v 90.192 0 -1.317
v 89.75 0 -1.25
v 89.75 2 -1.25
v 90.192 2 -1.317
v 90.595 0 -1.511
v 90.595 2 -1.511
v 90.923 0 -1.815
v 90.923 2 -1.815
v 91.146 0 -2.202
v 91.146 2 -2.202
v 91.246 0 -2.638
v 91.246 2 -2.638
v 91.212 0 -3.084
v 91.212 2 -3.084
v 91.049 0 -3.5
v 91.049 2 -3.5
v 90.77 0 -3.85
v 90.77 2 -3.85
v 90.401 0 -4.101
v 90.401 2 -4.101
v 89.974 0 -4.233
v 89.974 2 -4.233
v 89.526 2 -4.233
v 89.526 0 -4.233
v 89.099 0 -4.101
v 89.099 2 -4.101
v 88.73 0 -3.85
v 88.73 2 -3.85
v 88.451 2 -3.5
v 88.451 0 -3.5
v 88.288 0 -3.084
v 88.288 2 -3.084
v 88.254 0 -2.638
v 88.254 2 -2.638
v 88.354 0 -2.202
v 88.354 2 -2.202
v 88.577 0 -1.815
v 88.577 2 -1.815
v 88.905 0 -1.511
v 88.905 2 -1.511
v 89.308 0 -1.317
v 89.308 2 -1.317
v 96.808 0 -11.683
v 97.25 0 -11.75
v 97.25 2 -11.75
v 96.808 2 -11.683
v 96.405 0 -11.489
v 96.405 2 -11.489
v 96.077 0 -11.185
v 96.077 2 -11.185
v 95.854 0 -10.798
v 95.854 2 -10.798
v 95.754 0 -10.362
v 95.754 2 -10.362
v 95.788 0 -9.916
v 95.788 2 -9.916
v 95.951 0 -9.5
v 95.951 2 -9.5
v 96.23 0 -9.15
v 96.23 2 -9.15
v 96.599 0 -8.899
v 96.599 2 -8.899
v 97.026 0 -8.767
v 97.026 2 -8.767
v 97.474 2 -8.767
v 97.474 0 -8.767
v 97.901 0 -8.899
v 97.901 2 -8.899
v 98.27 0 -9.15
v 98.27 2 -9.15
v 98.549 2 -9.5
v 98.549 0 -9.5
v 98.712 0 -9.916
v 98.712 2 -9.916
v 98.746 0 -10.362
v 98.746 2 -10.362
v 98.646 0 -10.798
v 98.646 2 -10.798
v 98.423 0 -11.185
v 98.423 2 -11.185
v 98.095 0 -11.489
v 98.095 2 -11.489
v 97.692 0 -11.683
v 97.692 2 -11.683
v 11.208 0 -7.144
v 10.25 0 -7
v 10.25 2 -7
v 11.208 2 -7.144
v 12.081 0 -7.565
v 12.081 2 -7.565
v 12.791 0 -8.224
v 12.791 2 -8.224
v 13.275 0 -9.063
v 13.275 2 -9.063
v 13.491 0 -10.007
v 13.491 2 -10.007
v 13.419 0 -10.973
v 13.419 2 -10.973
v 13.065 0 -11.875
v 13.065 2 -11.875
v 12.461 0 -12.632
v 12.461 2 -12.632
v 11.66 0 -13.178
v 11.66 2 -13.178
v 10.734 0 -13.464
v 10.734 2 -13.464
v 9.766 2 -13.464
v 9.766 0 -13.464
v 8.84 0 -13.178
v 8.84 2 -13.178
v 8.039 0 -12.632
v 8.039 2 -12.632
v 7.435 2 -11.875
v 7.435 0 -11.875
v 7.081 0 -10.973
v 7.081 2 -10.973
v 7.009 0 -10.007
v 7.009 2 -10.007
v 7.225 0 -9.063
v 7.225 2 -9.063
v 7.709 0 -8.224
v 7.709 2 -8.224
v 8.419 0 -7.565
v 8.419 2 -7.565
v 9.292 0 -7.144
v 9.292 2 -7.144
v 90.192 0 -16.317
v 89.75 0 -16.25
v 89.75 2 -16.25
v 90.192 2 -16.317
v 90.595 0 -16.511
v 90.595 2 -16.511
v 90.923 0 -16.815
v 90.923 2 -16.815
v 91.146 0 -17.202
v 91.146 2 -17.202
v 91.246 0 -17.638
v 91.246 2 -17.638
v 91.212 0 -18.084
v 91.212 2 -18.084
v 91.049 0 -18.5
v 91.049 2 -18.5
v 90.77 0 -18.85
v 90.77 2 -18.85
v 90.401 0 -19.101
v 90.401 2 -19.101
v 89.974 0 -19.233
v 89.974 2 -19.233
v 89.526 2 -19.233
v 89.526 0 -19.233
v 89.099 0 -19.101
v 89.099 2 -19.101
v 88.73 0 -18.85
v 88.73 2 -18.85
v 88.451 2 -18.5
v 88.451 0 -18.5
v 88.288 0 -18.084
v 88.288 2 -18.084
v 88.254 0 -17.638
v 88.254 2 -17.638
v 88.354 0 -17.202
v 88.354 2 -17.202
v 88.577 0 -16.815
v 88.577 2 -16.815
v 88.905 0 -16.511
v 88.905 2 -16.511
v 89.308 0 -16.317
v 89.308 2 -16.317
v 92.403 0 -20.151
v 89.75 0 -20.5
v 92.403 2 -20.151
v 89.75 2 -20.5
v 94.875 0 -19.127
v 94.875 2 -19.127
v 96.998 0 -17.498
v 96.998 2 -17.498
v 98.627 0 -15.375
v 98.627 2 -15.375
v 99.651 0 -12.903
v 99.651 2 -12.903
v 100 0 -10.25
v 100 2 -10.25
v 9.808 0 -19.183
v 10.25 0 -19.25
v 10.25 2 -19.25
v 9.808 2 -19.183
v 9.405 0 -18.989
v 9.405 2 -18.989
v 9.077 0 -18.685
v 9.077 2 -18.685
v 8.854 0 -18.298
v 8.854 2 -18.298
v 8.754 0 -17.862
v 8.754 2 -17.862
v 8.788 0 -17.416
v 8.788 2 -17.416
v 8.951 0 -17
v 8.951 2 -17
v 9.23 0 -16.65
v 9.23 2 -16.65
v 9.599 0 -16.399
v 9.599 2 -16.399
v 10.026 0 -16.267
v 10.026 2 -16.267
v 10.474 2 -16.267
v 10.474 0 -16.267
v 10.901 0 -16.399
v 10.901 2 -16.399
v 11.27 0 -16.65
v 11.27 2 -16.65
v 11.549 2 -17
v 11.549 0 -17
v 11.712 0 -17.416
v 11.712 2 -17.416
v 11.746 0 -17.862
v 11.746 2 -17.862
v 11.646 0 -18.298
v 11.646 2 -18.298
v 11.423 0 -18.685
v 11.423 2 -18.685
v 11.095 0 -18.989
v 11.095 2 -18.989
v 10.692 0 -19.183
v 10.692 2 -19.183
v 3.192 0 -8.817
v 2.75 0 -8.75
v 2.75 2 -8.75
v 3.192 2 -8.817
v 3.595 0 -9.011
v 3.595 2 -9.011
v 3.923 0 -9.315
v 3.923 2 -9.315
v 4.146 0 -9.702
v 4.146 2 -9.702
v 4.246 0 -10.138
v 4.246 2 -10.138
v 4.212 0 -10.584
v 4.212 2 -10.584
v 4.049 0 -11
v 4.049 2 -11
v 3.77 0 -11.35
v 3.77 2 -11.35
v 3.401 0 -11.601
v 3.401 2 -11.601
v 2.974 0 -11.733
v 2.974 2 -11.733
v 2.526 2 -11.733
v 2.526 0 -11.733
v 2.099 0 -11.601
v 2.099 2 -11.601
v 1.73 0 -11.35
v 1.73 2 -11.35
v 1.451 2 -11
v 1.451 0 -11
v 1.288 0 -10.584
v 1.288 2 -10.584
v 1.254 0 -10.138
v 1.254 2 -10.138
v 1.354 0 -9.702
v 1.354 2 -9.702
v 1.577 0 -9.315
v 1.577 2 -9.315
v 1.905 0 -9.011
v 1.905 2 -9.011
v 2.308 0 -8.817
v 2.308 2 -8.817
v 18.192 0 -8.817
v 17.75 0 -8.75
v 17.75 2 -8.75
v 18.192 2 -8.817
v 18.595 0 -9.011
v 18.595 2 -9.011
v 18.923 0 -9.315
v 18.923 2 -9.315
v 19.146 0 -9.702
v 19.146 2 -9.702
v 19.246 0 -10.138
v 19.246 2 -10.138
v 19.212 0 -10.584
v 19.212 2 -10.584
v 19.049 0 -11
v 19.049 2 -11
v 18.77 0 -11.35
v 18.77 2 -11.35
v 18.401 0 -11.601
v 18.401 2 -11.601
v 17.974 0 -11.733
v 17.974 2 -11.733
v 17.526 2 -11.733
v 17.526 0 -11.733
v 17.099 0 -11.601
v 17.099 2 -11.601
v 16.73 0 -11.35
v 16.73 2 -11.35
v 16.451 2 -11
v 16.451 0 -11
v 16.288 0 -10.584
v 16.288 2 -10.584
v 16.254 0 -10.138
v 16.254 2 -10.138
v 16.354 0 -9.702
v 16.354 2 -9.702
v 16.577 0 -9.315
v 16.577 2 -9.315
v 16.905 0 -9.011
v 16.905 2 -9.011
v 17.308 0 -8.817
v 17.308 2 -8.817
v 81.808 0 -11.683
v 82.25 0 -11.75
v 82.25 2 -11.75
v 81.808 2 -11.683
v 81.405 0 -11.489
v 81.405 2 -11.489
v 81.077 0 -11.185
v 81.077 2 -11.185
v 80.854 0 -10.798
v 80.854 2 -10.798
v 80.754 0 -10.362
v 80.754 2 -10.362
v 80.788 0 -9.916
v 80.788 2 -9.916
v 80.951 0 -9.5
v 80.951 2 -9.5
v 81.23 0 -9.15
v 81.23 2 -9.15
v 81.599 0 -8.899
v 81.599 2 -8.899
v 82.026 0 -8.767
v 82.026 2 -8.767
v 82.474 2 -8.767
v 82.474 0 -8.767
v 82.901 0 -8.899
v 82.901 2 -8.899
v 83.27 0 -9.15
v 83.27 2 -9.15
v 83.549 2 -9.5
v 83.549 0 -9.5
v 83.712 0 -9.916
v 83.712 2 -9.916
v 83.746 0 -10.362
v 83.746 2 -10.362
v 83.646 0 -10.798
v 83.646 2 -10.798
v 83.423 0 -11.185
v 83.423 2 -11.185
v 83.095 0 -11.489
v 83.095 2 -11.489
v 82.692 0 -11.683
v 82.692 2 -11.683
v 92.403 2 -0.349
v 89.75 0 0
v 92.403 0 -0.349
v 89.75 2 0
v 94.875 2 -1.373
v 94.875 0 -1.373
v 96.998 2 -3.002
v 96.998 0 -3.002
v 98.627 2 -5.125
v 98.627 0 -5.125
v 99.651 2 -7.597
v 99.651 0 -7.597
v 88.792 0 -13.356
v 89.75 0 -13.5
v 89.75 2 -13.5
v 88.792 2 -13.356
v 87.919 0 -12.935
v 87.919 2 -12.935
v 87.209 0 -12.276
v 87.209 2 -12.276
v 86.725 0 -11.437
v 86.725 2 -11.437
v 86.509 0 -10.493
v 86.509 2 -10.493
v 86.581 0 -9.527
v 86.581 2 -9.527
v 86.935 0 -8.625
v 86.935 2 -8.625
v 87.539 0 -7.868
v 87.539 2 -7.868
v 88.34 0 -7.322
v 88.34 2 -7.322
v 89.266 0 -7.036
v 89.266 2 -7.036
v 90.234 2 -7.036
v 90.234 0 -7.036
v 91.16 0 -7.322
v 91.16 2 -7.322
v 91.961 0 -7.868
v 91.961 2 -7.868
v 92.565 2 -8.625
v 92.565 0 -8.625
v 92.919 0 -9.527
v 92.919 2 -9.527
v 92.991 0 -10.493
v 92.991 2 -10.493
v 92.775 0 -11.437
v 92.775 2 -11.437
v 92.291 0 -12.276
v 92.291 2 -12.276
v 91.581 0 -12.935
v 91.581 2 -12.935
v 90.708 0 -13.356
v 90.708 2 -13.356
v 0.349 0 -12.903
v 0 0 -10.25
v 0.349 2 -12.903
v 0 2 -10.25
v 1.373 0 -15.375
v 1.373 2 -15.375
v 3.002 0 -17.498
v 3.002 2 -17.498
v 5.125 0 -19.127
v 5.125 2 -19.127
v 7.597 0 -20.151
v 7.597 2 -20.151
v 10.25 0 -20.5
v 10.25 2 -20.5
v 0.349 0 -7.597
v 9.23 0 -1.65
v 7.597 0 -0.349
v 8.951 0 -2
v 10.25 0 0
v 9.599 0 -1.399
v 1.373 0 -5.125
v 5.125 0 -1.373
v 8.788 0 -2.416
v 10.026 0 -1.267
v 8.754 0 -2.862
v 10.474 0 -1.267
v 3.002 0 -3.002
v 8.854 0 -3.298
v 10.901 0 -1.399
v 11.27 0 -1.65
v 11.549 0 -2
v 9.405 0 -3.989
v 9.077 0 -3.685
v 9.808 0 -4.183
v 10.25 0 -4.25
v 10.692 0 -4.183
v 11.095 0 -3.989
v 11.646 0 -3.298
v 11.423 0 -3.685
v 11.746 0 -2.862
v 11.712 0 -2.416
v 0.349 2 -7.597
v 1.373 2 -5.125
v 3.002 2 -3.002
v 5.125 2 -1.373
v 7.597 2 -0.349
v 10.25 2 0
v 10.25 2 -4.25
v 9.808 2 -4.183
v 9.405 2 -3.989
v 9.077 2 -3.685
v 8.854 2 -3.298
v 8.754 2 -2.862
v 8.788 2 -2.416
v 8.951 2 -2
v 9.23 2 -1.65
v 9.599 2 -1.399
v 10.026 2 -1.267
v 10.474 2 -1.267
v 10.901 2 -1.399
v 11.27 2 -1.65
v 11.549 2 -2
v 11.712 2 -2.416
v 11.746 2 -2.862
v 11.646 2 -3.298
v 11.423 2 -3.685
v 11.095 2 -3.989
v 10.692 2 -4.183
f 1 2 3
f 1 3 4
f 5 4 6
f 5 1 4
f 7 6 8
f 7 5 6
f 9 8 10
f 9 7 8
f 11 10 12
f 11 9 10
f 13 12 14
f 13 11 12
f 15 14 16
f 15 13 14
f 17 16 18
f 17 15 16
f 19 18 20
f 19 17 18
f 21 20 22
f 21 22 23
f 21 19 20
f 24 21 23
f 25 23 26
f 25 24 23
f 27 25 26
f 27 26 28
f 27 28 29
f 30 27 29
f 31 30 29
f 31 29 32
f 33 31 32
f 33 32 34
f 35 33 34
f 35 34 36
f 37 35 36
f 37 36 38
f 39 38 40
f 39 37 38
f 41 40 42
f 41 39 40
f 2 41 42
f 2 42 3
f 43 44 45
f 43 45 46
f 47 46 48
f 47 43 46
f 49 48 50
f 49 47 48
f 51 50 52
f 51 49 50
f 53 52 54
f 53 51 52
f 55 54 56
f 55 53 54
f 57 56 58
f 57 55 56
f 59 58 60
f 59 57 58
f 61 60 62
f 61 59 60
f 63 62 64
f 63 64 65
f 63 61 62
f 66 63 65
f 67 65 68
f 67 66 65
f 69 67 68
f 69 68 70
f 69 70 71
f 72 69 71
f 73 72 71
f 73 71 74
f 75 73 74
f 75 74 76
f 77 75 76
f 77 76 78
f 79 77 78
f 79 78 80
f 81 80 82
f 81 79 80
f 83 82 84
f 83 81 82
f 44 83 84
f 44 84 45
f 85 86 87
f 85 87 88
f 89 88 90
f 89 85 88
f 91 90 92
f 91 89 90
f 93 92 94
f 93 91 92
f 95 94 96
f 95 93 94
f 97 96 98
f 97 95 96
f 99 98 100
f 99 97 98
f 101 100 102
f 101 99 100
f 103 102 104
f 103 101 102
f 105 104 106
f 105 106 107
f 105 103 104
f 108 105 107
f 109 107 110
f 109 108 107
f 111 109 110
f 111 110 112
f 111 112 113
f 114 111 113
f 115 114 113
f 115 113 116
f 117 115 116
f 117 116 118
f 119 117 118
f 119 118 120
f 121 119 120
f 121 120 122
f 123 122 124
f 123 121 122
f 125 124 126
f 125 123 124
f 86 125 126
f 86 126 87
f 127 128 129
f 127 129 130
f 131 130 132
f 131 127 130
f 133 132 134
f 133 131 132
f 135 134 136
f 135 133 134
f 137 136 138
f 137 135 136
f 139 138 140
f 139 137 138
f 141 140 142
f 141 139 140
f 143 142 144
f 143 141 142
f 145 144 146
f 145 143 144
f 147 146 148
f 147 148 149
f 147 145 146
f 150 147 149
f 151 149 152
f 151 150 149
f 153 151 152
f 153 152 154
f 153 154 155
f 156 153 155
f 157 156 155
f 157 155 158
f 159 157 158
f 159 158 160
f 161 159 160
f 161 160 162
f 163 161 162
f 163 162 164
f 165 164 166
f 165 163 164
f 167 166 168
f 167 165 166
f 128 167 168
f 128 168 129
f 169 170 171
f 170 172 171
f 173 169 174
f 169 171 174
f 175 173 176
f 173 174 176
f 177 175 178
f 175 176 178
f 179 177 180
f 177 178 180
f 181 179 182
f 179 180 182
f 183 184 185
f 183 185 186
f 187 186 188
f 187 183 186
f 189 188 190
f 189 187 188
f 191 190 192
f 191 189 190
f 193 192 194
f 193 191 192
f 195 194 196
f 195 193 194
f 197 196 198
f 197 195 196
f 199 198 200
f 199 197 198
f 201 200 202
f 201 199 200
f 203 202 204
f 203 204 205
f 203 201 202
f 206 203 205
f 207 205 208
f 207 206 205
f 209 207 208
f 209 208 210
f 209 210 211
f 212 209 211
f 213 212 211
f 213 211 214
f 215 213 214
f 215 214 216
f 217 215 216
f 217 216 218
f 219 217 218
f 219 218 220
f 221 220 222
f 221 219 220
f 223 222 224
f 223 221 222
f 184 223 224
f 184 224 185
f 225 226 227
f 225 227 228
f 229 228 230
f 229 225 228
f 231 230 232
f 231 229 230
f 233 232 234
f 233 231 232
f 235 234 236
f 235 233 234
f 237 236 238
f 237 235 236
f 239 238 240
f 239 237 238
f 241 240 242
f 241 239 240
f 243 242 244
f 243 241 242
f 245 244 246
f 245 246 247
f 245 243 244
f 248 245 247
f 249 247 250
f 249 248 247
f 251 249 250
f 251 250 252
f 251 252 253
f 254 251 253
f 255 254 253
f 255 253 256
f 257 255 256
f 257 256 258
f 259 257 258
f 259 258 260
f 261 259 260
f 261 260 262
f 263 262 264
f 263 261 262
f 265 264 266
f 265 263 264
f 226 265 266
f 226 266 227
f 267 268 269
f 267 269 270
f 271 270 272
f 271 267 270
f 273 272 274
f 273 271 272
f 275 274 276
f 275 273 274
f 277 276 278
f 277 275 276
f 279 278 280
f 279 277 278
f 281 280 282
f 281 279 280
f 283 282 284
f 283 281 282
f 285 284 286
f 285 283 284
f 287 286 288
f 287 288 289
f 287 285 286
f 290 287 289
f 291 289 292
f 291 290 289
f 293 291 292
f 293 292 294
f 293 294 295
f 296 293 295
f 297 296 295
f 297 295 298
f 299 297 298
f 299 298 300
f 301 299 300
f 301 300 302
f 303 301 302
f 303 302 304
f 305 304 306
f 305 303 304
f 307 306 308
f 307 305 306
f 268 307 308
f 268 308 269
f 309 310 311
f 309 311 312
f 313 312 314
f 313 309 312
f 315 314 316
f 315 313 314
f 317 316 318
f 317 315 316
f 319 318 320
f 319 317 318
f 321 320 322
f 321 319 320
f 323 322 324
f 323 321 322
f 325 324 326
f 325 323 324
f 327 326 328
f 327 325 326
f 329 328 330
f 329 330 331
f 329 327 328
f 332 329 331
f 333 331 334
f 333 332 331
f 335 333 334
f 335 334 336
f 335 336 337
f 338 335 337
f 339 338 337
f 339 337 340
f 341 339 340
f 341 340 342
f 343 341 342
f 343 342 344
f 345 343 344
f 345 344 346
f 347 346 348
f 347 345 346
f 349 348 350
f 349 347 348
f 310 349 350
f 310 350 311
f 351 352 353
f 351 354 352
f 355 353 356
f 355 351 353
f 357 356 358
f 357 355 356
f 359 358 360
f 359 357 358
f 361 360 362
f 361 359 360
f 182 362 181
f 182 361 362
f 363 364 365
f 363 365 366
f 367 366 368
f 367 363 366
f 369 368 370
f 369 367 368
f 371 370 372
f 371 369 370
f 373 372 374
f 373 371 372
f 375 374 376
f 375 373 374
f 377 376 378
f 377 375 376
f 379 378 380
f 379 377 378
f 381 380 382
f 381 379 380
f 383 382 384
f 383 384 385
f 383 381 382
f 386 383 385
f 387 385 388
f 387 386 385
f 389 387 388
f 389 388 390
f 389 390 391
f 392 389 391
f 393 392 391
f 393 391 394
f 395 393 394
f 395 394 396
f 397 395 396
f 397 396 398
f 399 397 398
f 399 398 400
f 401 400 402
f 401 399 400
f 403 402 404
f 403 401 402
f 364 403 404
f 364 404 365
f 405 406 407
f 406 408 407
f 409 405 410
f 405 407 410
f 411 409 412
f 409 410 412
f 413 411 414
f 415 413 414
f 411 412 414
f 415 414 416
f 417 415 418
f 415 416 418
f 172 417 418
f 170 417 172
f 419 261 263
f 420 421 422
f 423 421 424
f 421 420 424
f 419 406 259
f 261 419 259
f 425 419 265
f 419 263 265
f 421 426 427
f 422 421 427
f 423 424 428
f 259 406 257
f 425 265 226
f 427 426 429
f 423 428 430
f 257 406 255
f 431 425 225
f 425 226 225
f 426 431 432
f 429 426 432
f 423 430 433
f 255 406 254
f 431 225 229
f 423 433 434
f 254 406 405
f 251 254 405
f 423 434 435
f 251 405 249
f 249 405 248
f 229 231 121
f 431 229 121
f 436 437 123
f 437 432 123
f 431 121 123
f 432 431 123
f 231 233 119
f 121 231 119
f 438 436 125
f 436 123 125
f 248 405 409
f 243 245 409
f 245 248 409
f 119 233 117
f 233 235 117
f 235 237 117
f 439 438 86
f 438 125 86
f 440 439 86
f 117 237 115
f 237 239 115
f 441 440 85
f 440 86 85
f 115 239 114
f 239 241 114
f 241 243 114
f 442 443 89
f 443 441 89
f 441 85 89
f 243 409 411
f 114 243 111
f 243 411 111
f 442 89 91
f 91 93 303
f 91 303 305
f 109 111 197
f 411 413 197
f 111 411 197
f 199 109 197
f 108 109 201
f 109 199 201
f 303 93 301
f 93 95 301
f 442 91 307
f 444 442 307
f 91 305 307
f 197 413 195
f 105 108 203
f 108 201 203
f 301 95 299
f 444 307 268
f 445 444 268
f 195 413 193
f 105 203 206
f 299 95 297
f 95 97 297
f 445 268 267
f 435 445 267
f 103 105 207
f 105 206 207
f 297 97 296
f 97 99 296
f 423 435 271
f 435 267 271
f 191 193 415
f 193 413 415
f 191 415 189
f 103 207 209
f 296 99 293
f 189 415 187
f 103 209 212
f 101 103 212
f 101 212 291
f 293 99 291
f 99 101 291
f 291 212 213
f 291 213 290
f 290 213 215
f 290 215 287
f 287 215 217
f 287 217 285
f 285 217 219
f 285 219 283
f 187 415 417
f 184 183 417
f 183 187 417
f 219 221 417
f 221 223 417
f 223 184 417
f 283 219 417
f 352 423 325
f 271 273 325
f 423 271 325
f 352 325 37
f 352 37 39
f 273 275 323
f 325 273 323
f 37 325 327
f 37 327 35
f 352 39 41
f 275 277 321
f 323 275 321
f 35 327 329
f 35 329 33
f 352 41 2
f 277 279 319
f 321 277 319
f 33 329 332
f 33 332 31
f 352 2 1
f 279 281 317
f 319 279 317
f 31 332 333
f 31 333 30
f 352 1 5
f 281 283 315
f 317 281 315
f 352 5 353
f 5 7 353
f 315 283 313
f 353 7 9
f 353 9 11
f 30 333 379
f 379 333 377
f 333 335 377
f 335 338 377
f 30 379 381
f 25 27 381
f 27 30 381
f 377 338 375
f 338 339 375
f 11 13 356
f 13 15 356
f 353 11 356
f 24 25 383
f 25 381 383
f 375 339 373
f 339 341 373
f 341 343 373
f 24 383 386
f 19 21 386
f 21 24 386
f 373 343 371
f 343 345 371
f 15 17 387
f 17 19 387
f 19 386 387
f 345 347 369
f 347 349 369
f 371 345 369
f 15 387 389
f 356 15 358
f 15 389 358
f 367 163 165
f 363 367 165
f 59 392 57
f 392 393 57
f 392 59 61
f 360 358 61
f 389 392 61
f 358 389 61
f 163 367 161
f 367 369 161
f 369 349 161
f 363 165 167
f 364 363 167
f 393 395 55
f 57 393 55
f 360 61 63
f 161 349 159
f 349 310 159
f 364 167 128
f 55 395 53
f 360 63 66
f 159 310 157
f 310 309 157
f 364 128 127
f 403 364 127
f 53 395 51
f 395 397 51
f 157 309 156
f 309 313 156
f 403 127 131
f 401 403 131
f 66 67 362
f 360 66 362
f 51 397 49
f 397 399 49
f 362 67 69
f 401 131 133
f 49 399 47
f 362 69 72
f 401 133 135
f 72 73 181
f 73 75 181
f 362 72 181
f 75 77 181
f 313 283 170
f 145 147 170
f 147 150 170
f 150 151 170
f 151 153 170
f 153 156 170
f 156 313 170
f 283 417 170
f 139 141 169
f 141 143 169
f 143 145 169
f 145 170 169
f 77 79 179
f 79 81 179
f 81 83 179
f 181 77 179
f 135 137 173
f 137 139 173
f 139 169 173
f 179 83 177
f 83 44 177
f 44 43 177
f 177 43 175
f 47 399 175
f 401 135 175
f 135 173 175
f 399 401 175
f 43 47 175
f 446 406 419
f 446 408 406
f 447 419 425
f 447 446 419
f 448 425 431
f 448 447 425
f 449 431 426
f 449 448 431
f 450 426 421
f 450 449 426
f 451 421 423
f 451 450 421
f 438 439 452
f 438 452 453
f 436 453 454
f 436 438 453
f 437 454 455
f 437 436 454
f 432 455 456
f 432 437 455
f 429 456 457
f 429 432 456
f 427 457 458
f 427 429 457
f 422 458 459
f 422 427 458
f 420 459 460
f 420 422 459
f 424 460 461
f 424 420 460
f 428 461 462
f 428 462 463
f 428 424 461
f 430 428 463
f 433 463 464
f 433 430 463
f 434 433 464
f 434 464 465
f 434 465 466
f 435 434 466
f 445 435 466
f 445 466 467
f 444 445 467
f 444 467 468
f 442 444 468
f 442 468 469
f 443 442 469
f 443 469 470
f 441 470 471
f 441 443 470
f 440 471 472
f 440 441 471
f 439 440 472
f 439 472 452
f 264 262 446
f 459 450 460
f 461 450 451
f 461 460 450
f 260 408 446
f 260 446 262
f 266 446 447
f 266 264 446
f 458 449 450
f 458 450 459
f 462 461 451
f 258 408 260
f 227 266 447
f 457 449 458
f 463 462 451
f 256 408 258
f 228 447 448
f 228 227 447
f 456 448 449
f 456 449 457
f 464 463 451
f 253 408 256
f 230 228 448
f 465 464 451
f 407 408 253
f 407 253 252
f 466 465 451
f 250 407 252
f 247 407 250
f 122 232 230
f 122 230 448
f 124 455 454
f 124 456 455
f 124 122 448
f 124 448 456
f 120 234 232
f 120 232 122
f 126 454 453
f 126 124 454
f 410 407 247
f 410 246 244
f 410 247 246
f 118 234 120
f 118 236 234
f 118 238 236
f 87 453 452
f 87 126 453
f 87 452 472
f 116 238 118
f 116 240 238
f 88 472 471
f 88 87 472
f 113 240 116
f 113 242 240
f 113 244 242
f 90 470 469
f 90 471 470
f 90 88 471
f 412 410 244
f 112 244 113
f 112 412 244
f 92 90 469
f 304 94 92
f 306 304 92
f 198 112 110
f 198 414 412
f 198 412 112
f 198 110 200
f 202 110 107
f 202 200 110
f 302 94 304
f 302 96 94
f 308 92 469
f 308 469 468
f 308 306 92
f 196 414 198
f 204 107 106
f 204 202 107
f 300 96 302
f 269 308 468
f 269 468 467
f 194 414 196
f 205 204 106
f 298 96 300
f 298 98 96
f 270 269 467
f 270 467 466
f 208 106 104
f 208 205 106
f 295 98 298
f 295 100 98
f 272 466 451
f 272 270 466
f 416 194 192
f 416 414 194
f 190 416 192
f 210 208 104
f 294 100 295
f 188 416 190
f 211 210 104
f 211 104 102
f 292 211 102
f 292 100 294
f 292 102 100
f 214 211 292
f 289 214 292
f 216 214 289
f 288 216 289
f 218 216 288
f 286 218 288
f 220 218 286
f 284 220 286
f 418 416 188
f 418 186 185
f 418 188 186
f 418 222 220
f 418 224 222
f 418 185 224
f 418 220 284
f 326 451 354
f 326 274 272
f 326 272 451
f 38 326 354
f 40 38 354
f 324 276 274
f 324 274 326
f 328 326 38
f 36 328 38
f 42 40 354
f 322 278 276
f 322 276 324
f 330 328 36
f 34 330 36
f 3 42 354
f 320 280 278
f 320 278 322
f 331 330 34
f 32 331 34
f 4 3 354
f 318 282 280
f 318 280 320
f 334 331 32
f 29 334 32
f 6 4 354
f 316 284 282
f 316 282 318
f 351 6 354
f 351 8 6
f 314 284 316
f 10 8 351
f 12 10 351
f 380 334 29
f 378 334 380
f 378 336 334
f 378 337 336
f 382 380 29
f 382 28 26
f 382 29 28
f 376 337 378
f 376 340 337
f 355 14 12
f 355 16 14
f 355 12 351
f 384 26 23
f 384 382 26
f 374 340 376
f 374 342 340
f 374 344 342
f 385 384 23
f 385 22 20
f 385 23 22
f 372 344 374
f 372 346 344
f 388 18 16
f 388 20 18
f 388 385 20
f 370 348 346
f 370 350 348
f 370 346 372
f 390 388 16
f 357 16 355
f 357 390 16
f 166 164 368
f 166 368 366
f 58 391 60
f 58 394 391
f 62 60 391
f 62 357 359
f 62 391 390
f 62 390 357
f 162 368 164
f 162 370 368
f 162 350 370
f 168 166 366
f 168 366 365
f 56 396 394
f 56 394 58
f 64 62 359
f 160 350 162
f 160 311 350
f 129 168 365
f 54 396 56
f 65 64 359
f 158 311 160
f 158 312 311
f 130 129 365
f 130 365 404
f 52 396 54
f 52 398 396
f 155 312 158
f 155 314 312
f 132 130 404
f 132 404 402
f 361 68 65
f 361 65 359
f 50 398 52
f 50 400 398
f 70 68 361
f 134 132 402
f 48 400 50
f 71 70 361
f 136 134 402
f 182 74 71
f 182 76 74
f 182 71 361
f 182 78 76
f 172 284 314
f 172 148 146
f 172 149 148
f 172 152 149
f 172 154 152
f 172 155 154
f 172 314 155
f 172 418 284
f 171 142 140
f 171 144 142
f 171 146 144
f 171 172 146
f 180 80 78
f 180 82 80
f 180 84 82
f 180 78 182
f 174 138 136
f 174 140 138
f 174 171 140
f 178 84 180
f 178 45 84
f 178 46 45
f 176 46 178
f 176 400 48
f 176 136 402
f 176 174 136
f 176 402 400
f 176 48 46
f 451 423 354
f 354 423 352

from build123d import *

# Parameters (mm, degrees)
SKETCH1_W           = 100
SKETCH1_H           = 20.5
SKETCH1_R           = 3.25
SKETCH1_R_2         = 1.5
BOSS_EXTRUDE1_DEPTH = 2
FILLET1_R           = 10.25


with BuildPart() as part:
    # Sketch1 → Boss-Extrude1 (new body)
    with BuildSketch(Plane(origin=(0, 0, 0), x_dir=(1, 0, 0), z_dir=(0, 1, 0))):
        with Locations((50, 10.25)):
            Rectangle(SKETCH1_W, SKETCH1_H)
        with Locations(Location((10.25, 10.25, 0), (0, 0, 270))):
            Circle(SKETCH1_R, mode=Mode.SUBTRACT)
        with Locations(Location((17.75, 10.25, 0), (0, 0, 270))):
            Circle(SKETCH1_R_2, mode=Mode.SUBTRACT)
        with Locations(Location((10.25, 17.75, 0), (0, 0, 90))):
            Circle(SKETCH1_R_2, mode=Mode.SUBTRACT)
        with Locations(Location((10.25, 2.75, 0), (0, 0, 90))):
            Circle(SKETCH1_R_2, mode=Mode.SUBTRACT)
        with Locations(Location((2.75, 10.25, 0), (0, 0, 270))):
            Circle(SKETCH1_R_2, mode=Mode.SUBTRACT)
        with Locations(Location((82.25, 10.25, 0), (0, 0, 90))):
            Circle(SKETCH1_R_2, mode=Mode.SUBTRACT)
        with Locations(Location((89.75, 17.75, 0), (0, 0, 270))):
            Circle(SKETCH1_R_2, mode=Mode.SUBTRACT)
        with Locations(Location((89.75, 2.75, 0), (0, 0, 270))):
            Circle(SKETCH1_R_2, mode=Mode.SUBTRACT)
        with Locations(Location((97.25, 10.25, 0), (0, 0, 90))):
            Circle(SKETCH1_R_2, mode=Mode.SUBTRACT)
        with Locations(Location((89.75, 10.25, 0), (0, 0, 90))):
            Circle(SKETCH1_R, mode=Mode.SUBTRACT)
    extrude(amount=BOSS_EXTRUDE1_DEPTH)

    # Fillet1
    fillet1_edges = [part.edges().sort_by_distance(p)[0] for p in [
        (0, 1, 0),
        (0, 1, -20.5),
        (100, 1, -20.5),
        (100, 1, 0),
    ]]
    fillet(fillet1_edges, radius=FILLET1_R - 0.0001)  # a hair under: the kernel refuses the full size


solid = part.part
